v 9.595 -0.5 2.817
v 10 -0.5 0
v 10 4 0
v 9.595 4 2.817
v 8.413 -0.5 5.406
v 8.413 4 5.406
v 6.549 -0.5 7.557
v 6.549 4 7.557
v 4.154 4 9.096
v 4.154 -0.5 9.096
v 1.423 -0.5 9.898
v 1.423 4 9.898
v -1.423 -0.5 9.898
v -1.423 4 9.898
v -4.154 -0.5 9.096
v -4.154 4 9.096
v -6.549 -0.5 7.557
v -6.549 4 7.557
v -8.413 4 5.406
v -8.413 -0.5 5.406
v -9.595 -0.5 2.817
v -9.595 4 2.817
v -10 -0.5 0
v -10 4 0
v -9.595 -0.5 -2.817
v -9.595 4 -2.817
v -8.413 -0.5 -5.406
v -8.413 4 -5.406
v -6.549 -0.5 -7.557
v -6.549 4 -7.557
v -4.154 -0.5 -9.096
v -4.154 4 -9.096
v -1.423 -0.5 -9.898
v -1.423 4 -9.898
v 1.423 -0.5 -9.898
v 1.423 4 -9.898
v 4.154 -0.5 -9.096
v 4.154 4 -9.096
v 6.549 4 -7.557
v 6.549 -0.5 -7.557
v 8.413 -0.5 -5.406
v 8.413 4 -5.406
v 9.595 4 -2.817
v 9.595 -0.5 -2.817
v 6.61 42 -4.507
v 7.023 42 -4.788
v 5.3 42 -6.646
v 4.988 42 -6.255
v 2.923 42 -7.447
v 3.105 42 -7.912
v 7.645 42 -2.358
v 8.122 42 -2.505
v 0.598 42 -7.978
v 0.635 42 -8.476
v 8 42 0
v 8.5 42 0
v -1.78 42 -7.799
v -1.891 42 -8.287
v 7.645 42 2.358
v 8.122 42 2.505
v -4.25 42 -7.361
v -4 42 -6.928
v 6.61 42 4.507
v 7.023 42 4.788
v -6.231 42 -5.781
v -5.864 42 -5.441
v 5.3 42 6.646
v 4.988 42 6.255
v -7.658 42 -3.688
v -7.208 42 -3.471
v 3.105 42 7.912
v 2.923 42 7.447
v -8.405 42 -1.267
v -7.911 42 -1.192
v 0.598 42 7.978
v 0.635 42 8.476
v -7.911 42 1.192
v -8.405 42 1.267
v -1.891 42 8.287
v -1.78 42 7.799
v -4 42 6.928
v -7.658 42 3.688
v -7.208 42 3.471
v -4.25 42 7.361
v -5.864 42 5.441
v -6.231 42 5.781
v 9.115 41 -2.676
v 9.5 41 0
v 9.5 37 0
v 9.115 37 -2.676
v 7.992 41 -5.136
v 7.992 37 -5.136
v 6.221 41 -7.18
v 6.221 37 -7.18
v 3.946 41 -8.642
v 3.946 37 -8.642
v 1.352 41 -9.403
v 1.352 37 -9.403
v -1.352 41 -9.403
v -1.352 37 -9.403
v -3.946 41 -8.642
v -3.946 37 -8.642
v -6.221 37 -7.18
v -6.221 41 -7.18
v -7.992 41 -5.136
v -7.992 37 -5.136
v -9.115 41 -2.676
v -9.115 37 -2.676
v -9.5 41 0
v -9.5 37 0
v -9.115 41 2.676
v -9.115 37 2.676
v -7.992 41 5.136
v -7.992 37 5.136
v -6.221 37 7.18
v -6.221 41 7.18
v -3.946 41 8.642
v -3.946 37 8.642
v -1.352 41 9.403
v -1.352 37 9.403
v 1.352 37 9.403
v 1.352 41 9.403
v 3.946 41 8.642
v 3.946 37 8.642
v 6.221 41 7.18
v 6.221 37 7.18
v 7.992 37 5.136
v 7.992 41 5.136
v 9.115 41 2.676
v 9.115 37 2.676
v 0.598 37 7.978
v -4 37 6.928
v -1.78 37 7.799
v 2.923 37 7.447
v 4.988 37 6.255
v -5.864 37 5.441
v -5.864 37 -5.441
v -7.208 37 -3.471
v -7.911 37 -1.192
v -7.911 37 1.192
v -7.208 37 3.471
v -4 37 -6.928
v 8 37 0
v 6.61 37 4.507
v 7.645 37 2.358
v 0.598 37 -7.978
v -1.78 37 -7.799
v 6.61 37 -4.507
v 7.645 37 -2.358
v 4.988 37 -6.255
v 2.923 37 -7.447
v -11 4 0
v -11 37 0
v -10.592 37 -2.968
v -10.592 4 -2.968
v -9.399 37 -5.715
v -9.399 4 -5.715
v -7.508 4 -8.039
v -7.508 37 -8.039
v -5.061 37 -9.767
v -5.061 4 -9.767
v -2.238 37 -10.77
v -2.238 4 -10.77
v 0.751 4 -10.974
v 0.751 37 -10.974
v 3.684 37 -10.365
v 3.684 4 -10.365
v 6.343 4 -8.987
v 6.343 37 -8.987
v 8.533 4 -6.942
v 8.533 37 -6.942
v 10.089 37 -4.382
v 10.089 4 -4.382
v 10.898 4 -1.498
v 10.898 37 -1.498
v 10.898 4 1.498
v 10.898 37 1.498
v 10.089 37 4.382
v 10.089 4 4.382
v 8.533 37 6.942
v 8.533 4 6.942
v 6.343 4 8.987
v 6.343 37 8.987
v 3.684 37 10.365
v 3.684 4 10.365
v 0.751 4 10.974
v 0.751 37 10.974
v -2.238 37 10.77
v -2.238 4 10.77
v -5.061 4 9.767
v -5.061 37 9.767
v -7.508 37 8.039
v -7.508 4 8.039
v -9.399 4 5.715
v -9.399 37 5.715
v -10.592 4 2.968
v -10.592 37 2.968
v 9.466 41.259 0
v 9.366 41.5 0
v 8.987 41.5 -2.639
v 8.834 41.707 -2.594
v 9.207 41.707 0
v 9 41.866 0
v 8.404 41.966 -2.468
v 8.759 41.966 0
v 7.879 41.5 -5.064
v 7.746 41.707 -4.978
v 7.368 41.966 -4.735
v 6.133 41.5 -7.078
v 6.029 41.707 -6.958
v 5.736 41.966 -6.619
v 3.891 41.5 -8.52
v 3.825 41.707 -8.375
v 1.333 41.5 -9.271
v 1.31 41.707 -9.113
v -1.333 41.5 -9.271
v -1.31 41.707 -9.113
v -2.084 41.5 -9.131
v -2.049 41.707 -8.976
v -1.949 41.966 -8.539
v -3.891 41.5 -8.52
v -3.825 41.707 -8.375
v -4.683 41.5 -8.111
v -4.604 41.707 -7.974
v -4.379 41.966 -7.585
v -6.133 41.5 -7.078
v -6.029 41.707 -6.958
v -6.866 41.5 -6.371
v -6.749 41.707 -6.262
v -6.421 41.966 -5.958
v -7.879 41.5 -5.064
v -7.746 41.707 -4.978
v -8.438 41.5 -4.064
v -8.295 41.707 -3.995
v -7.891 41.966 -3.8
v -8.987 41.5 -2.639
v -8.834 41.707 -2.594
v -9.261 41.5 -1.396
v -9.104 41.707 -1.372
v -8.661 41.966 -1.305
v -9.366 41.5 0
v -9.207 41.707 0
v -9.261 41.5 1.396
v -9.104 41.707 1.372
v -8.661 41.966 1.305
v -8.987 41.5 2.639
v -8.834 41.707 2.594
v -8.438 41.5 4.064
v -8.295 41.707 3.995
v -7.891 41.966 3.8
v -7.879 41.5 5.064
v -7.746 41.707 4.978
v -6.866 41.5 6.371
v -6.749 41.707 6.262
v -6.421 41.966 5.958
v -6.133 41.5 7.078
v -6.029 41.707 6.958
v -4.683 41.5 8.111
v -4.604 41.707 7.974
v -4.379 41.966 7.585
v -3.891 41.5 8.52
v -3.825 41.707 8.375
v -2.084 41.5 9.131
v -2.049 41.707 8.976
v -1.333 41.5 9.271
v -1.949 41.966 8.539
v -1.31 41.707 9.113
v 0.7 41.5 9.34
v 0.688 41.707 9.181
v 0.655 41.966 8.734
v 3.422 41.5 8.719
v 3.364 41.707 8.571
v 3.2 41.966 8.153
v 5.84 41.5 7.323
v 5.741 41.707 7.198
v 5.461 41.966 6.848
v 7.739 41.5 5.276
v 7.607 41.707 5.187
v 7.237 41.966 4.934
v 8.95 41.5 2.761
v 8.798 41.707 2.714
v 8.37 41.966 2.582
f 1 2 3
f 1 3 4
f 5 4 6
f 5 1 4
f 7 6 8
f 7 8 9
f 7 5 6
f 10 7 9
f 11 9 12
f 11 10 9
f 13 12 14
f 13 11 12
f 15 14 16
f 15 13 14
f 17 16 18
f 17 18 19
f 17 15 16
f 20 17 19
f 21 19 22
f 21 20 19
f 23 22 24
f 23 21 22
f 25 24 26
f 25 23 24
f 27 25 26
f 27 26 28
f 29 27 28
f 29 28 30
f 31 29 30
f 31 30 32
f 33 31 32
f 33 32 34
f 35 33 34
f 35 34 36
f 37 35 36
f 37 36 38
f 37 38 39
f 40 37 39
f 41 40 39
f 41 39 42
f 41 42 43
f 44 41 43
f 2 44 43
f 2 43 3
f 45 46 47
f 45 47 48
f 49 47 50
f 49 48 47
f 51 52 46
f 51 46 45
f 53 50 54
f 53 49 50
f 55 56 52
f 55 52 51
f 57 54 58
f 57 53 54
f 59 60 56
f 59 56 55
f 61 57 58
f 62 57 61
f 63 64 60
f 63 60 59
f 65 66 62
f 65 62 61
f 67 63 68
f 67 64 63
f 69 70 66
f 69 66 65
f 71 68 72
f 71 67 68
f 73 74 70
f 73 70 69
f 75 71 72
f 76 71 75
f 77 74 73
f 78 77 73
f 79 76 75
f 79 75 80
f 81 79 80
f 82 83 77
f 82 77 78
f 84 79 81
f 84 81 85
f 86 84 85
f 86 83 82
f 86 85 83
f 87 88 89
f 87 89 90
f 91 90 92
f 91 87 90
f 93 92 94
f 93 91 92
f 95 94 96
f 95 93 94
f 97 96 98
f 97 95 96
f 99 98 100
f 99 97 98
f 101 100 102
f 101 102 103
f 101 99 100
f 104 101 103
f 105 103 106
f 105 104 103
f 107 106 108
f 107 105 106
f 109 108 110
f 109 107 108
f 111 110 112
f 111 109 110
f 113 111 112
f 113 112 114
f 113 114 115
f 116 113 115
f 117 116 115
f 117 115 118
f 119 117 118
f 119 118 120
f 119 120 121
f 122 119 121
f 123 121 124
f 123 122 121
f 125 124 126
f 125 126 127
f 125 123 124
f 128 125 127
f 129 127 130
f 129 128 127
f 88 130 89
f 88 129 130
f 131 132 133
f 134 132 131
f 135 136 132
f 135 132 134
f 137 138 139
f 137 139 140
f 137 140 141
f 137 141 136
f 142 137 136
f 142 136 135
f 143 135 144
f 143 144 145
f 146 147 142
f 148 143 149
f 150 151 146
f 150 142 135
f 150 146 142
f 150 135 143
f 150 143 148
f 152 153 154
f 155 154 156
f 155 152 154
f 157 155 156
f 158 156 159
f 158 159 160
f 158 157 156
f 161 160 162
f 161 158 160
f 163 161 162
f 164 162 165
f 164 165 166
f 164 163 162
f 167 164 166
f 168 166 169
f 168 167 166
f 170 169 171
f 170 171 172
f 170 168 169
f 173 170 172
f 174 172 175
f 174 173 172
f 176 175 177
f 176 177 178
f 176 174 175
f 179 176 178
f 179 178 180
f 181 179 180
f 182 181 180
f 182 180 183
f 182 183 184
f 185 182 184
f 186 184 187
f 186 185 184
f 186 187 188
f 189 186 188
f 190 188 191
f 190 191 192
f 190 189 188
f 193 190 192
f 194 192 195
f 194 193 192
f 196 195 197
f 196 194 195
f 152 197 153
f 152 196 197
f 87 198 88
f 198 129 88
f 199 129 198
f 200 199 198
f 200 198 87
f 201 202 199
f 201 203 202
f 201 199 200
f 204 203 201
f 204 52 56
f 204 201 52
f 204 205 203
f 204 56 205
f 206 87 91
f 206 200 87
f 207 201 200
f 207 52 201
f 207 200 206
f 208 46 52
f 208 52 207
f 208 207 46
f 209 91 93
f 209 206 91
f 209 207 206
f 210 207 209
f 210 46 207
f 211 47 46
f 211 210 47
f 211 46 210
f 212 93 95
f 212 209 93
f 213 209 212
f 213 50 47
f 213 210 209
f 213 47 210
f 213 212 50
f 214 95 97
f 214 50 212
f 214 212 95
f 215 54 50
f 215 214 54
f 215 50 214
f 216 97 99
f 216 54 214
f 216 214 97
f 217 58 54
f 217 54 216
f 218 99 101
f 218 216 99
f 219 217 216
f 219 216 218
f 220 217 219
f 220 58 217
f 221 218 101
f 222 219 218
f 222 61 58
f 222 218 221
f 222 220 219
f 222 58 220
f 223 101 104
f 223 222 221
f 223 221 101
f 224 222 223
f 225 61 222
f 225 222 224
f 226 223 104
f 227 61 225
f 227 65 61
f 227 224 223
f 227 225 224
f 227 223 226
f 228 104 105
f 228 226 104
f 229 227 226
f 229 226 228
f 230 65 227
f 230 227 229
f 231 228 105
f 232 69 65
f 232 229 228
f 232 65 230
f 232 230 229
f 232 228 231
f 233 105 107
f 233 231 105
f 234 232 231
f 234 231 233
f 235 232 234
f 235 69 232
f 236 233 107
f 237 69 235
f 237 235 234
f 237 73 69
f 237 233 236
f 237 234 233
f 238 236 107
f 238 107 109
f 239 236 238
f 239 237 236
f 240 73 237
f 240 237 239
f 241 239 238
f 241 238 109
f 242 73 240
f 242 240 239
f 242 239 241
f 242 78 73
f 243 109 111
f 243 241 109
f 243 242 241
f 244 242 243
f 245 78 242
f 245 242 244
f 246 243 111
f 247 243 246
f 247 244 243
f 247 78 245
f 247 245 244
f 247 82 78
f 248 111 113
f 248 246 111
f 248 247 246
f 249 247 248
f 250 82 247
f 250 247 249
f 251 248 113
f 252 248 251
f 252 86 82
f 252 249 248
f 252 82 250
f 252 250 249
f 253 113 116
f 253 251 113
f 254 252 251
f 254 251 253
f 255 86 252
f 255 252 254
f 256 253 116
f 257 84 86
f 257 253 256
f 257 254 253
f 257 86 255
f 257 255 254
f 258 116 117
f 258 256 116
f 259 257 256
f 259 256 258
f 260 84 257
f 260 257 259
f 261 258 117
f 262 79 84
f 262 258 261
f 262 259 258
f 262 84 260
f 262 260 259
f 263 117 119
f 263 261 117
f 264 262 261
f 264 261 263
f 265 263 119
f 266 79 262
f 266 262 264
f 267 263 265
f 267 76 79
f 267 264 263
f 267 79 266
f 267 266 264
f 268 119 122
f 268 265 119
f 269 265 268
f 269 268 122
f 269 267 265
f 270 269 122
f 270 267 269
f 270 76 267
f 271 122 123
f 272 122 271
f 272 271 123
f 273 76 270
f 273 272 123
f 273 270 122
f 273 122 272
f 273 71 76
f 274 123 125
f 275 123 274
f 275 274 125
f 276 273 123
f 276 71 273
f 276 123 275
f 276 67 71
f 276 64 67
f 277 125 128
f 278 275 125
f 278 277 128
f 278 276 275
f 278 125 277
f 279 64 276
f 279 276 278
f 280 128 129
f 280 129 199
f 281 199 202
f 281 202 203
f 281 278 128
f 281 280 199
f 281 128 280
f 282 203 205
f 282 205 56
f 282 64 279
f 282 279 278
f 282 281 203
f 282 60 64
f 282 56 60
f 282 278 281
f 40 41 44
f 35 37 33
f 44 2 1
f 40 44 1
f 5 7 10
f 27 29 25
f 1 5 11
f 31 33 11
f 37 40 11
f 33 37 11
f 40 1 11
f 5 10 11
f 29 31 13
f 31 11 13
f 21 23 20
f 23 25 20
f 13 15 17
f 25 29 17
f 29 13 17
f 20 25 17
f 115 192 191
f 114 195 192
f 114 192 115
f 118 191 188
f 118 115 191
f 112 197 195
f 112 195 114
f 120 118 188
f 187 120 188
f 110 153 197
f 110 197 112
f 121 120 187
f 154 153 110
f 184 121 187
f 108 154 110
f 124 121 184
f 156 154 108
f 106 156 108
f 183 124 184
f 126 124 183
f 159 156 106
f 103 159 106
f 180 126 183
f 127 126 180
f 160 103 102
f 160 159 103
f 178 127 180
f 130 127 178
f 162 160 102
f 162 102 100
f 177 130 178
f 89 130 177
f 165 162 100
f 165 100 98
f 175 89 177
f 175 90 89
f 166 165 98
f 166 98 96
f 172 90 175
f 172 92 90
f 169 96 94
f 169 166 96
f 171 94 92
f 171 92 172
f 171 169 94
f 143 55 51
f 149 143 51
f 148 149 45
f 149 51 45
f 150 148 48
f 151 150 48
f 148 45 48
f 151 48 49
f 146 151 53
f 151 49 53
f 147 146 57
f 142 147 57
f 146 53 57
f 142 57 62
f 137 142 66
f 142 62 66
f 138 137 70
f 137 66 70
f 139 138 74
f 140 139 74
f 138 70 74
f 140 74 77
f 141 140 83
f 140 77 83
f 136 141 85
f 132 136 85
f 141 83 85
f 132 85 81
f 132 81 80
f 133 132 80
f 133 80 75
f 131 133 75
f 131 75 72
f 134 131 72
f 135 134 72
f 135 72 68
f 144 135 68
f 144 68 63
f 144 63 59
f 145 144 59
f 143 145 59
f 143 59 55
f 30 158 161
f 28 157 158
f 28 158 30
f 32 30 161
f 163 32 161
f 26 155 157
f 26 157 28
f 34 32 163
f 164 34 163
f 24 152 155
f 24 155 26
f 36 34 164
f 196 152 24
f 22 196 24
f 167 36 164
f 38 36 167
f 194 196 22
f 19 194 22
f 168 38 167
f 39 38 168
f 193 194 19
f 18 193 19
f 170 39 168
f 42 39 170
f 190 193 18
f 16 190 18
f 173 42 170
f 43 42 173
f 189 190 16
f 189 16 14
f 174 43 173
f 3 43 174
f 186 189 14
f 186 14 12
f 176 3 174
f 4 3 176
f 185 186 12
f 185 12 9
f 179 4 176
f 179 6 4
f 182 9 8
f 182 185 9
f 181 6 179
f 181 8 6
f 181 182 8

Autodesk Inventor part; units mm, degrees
ref_plane "YZ Plane" through (0, 0, 0) normal (1, 0, 0) x (0, 1, 0)
ref_plane "XZ Plane" through (0, 0, 0) normal (0, 1, 0) x (-1, 0, 0)
ref_plane "XY Plane" through (0, 0, 0) normal (0, 0, 1) x (1, 0, 0)
sketch "Sketch1" plane through (0, 0, 0) normal (0, 1, 0) x (-1, 0, 0)
  circle A0 centre (0, 0) radius 12
  dimension "d0" = 24
extrude "Extrusion1" add sketch "Sketch1" along normal blind 42
sketch "Sketch2" plane through (0, 0, 0) normal (0, -1, 0) x (1, 0, 0)
  circle A0 centre (0, 0) radius 10
  circle A1 centre (0, 0) radius 12 projected
  dimension "d3" = 20
extrude "Extrusion2" cut sketch "Sketch2" against normal blind 4
sketch "Sketch3" plane through (0, 42, 0) normal (0, 1, 0) x (1, 0, 0)
  circle A0 centre (0, 0) radius 9.5
  circle A1 centre (0, 0) radius 12 projected
  dimension "d6" = 19
extrude "Extrusion3" cut sketch "Sketch3" against normal blind 3
move faces "Move1" translate (0, -0.5, 0) faces at (-3.2365, 0, -3.6231)
offset faces "Size1" outward -1 faces at (-11.9611, 15.6667, 0.9656)
move faces "Move2" translate (0, -2, 0) faces at (-10.3014, 39, 1.6353)
sketch "Sketch5" plane through (0, 42, 0) normal (0, 1, 0) x (1, 0, 0)
  circle A0 centre (0, 0) radius 8
  circle A1 centre (0, 0) radius 9.5 projected
  dimension "d20" = 16
extrude "Extrusion5" cut sketch "Sketch5" against normal blind 5 contours A0
fillet "Fillet2" radius 1 1 edges at (-9.5, 42, 0)
properties part number "10x Obj Lens Finite 160mm"
